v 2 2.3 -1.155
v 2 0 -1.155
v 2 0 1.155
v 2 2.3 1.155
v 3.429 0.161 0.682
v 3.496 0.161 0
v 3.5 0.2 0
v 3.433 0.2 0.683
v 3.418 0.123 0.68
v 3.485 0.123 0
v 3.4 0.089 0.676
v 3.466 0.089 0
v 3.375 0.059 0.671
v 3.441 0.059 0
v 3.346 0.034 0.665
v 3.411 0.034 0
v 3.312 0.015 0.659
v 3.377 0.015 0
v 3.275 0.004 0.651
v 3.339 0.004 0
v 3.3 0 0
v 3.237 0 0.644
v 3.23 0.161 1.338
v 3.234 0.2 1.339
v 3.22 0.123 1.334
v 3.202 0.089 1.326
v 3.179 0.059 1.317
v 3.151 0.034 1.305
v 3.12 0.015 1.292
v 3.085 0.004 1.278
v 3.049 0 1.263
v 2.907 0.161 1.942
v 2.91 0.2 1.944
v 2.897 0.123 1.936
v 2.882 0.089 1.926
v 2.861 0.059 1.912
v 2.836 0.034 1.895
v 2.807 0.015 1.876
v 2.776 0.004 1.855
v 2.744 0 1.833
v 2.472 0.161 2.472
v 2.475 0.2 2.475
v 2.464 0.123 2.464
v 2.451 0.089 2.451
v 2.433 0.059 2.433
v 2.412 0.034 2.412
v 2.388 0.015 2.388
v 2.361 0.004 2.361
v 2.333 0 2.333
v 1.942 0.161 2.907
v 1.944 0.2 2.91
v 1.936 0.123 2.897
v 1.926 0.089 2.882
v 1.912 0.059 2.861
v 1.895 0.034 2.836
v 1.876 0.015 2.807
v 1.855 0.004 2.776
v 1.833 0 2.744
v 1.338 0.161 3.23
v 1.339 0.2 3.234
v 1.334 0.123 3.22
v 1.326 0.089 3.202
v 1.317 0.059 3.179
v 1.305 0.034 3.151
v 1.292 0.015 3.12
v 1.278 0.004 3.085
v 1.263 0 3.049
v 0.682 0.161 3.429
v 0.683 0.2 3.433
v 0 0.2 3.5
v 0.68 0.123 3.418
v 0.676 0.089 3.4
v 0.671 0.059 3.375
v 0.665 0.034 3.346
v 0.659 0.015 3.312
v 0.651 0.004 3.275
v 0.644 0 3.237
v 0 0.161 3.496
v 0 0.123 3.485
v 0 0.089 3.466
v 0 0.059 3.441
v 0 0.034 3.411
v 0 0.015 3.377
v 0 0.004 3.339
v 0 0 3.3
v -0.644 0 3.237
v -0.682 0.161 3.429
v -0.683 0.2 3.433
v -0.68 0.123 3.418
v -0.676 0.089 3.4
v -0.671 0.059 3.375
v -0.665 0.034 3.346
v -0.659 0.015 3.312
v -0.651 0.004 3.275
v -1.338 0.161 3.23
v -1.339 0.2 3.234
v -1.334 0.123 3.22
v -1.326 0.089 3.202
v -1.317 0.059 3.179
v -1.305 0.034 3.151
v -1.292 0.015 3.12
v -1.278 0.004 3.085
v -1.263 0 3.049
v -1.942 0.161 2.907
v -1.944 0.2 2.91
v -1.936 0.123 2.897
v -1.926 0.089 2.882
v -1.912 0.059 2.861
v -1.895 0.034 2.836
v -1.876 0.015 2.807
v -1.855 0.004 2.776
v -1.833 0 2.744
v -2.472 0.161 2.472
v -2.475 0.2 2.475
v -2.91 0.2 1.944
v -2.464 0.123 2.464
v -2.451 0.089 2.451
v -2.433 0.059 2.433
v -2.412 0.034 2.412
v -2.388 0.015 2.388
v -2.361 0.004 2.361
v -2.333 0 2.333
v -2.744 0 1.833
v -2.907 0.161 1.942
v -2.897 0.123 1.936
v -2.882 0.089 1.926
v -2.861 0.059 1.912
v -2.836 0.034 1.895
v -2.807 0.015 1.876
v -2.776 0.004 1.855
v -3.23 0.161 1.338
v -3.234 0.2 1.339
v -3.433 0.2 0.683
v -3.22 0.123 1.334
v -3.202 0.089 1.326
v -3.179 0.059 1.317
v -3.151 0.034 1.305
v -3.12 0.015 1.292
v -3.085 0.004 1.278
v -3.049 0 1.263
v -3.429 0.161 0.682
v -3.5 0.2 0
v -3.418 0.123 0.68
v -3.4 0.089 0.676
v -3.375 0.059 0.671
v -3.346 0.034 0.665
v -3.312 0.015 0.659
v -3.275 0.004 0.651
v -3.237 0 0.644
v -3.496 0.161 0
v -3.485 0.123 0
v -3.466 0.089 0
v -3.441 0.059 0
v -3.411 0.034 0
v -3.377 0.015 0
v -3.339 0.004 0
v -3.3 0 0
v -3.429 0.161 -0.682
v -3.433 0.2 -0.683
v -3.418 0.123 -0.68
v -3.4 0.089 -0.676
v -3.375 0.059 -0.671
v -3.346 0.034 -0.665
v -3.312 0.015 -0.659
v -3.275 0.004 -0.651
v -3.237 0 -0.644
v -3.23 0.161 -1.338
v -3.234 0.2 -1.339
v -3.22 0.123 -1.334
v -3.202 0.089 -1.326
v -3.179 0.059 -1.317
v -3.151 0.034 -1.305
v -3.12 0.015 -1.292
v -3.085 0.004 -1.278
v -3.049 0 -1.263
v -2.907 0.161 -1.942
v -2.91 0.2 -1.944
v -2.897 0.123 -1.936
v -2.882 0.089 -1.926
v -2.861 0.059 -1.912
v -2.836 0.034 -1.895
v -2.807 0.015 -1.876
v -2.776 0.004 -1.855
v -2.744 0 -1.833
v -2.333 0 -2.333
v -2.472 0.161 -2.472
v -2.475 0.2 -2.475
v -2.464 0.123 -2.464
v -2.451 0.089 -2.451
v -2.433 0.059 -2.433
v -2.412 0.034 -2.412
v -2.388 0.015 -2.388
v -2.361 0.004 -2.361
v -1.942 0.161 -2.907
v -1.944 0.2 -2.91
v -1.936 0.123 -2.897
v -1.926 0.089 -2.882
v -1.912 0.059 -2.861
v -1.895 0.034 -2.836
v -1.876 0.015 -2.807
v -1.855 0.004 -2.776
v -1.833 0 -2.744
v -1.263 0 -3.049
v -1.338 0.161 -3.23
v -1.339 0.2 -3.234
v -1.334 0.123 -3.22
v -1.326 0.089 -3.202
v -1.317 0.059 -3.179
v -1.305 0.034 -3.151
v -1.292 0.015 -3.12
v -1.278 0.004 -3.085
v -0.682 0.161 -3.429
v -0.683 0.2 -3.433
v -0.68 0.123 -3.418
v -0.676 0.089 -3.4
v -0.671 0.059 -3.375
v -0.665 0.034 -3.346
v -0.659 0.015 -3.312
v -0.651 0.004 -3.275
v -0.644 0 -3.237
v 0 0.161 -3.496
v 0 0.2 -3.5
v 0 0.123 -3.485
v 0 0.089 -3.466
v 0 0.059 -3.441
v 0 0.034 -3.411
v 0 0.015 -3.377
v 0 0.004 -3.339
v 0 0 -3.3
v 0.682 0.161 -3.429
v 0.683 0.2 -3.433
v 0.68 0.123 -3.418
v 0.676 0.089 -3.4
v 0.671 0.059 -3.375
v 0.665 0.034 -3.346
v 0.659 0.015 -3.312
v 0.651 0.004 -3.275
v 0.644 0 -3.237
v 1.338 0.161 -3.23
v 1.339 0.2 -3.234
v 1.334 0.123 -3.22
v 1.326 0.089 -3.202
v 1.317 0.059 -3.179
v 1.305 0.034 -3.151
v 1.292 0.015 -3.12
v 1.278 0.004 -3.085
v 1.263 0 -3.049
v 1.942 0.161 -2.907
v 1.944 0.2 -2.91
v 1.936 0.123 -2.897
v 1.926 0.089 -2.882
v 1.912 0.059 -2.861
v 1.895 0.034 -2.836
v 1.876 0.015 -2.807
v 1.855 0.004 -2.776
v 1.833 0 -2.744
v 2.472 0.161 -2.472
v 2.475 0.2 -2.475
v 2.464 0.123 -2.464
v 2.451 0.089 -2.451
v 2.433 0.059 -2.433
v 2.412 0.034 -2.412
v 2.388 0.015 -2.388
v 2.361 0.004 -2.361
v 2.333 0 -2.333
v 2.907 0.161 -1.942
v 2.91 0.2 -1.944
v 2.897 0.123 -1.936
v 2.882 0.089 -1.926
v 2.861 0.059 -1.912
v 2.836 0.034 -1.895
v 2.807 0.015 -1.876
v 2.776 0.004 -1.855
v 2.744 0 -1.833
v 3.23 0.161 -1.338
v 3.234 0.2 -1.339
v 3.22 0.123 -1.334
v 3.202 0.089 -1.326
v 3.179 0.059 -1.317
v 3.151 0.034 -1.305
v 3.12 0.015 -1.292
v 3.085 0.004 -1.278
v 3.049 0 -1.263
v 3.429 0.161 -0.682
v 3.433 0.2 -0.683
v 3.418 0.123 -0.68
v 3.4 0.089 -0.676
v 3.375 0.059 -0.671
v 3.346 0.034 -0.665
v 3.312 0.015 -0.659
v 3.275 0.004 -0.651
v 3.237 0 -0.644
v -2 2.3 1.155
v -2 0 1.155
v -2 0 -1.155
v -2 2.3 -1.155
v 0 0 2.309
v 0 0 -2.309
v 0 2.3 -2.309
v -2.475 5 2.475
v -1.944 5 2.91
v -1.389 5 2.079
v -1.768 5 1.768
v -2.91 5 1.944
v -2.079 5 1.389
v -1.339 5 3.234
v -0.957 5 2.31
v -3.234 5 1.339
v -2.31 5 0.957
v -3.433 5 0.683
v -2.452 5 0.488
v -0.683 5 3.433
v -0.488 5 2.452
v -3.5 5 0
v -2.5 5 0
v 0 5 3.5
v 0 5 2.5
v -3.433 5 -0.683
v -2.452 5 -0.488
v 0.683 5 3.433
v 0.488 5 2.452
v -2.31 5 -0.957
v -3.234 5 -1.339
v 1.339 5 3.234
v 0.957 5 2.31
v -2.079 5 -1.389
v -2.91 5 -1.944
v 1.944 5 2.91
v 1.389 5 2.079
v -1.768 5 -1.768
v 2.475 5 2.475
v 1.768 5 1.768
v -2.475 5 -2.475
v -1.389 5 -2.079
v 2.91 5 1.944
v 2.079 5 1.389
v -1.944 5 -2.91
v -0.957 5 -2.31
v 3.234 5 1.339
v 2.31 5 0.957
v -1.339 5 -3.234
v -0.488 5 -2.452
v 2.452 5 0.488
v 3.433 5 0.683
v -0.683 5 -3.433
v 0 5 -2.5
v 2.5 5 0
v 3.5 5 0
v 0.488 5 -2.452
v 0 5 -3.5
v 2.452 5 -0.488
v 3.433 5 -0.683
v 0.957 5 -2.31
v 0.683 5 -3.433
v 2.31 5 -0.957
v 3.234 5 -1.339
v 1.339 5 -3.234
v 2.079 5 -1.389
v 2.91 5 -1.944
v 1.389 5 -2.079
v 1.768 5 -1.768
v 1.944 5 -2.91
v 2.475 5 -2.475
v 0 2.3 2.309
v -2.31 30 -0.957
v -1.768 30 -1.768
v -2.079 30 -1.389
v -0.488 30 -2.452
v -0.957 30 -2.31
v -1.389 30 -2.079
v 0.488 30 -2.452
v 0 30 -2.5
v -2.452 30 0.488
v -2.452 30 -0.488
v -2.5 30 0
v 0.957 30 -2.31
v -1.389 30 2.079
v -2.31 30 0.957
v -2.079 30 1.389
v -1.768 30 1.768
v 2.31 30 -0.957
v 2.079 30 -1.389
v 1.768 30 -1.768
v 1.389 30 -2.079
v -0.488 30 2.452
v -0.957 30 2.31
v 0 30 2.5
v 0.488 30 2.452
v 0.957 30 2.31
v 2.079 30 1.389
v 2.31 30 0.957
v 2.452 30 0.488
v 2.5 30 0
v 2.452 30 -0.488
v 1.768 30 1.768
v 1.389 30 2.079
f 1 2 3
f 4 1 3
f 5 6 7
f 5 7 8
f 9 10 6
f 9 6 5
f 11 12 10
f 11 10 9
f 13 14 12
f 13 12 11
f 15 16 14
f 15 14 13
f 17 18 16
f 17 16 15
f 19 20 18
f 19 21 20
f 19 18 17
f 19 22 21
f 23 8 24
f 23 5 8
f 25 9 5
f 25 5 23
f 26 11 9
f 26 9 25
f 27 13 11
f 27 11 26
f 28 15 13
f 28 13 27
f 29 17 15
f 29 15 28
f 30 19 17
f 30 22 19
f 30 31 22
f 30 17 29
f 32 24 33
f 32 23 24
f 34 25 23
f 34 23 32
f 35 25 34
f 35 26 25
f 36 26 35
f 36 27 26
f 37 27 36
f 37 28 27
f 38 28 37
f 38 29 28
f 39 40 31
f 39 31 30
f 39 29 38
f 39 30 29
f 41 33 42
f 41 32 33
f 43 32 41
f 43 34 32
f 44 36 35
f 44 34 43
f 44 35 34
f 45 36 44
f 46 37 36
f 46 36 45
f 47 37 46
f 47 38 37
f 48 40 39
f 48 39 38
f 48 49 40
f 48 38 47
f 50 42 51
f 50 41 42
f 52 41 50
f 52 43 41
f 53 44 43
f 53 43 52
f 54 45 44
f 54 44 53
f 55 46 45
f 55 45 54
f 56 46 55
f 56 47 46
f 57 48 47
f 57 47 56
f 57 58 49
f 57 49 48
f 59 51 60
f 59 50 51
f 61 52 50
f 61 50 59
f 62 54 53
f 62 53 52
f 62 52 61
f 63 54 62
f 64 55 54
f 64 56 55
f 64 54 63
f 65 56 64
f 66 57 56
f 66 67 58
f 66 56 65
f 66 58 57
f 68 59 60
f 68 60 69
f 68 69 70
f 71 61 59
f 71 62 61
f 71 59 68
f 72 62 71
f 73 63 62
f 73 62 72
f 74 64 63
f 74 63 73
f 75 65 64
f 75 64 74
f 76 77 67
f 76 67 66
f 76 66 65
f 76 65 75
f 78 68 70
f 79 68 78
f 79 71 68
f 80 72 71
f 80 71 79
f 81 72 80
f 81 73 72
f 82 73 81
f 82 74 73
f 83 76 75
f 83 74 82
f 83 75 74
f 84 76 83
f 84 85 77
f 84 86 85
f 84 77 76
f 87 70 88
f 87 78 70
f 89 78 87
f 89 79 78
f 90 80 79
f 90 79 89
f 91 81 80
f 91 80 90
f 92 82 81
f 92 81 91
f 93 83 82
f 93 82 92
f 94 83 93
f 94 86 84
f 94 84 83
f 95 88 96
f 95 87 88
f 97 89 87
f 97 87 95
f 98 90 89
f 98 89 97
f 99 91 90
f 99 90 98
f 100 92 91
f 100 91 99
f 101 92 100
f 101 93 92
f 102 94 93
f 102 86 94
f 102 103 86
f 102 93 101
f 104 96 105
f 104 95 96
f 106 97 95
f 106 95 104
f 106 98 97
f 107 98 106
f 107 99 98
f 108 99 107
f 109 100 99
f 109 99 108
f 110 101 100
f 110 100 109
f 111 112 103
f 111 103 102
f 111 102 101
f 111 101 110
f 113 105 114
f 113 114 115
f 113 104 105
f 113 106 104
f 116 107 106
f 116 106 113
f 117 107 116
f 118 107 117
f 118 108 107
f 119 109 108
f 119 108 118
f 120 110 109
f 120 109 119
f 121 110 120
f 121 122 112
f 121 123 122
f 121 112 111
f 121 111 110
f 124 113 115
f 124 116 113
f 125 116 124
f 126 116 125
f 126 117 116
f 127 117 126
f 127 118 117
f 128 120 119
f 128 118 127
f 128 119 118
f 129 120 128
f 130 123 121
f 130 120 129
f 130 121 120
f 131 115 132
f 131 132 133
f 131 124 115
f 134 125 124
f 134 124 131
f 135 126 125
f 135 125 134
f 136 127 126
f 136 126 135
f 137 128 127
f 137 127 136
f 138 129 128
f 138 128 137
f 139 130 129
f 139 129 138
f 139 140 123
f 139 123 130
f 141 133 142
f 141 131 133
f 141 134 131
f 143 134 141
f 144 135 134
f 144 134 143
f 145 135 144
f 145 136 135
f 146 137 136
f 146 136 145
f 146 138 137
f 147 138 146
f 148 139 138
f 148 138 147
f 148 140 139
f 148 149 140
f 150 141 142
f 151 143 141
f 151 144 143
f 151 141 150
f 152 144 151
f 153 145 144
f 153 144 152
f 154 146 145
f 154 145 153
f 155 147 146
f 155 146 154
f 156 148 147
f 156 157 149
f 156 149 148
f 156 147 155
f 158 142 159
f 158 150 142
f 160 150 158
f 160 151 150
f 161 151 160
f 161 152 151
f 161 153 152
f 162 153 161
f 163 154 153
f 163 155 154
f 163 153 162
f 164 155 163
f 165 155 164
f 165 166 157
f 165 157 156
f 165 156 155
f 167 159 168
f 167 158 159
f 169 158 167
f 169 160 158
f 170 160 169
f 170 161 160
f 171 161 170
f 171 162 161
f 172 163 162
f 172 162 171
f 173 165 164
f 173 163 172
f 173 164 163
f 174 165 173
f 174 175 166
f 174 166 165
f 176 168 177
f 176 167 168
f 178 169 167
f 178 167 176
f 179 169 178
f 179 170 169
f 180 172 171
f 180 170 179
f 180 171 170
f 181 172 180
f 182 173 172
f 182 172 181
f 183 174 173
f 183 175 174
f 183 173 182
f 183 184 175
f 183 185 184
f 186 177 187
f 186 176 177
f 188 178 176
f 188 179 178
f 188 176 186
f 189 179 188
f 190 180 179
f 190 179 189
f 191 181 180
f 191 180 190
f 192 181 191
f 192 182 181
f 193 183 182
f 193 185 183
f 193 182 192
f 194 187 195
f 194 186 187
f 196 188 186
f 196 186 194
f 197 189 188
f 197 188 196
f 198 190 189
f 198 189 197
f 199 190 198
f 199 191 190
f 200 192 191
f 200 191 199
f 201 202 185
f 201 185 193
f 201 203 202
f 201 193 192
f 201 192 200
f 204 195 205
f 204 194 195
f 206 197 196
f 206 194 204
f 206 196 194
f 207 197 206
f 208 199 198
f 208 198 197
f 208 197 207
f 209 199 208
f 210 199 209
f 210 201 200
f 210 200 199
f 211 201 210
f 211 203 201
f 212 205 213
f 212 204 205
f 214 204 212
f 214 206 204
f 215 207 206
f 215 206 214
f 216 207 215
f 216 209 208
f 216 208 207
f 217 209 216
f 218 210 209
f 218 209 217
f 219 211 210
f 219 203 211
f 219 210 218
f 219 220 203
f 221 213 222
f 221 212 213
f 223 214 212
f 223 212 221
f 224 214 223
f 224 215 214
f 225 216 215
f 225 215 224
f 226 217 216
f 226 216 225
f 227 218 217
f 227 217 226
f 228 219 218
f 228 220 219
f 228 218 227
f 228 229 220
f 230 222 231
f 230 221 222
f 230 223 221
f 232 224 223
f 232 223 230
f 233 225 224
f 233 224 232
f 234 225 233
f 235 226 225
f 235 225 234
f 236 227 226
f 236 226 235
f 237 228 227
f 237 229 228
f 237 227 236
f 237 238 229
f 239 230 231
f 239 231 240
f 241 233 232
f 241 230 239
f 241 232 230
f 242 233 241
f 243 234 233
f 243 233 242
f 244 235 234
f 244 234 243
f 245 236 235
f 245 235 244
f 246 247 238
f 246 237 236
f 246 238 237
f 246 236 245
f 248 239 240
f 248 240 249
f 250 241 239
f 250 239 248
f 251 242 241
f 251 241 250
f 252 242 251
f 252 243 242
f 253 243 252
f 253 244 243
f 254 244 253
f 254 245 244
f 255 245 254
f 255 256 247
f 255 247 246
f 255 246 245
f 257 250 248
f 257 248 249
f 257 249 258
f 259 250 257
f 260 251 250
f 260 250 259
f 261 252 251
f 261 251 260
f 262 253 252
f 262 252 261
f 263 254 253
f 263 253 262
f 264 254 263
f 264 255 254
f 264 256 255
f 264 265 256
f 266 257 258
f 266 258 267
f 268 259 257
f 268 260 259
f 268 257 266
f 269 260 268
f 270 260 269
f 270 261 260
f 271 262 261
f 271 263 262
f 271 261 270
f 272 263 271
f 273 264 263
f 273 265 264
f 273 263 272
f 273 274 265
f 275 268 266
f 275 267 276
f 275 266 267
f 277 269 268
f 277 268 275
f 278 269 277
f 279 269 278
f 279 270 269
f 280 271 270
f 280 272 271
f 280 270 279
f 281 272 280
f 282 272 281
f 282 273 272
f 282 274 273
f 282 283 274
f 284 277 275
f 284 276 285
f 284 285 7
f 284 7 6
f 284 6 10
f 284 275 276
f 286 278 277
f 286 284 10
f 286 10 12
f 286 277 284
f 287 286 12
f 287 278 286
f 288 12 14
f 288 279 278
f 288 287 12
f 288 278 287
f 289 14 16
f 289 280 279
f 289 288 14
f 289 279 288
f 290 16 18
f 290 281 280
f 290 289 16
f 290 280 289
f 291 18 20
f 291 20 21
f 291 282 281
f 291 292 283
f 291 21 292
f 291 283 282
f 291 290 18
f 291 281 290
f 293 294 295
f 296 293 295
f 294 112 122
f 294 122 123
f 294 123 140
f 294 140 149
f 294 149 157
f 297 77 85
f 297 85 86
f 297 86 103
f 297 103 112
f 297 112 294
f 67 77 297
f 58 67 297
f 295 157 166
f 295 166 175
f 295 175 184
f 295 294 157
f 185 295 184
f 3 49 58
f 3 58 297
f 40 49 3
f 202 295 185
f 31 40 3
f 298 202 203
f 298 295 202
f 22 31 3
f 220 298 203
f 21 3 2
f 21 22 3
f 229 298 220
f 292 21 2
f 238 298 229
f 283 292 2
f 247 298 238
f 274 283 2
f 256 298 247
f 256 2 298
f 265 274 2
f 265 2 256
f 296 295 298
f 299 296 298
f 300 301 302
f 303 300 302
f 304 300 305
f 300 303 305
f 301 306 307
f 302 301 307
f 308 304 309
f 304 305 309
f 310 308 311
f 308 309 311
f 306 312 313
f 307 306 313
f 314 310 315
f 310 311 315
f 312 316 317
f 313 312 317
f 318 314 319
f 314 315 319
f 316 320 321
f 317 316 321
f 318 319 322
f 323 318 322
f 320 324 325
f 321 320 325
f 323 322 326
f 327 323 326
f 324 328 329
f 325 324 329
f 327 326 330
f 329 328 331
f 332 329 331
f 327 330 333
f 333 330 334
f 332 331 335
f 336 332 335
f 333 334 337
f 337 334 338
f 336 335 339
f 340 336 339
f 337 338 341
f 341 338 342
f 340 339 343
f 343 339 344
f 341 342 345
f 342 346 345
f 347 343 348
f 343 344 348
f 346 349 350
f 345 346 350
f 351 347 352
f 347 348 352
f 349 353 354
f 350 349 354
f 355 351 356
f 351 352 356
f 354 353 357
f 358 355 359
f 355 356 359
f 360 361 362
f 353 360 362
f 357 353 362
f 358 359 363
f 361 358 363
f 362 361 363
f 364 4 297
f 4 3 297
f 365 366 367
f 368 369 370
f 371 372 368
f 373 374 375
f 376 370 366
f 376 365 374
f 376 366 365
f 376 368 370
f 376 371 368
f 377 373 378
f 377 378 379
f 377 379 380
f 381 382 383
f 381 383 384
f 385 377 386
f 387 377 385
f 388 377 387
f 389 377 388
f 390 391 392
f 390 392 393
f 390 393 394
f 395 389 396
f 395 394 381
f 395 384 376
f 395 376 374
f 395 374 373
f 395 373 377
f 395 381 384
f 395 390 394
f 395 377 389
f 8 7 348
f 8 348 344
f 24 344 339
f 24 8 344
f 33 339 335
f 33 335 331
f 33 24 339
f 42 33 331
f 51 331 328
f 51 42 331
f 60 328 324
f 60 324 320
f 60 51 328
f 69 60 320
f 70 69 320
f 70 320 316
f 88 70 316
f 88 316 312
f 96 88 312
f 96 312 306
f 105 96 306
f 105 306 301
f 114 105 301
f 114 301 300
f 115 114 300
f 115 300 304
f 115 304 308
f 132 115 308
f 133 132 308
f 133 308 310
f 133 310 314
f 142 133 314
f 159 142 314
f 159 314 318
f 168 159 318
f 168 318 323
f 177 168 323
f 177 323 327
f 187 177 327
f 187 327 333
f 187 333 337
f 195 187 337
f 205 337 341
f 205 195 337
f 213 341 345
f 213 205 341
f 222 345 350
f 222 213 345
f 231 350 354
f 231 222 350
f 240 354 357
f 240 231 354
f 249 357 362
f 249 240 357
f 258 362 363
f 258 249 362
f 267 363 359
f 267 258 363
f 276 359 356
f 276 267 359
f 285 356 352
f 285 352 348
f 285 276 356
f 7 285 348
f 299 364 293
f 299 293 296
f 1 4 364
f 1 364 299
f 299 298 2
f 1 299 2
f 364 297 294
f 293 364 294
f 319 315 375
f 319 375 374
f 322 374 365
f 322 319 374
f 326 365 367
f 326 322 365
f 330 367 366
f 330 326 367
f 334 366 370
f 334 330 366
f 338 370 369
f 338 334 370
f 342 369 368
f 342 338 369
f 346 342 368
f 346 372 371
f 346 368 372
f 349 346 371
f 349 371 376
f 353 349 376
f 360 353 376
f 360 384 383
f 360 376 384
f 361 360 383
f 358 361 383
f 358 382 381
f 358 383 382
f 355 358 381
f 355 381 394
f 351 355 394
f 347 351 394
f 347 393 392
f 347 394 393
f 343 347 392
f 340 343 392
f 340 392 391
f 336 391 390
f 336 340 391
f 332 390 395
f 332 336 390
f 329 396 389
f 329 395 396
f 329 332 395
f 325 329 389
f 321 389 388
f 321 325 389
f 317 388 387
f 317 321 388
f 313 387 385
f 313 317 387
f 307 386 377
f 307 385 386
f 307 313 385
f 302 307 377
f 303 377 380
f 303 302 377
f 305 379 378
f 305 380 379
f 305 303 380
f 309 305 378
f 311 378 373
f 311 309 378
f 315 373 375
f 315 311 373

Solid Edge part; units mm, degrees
sketch "Sketch1" plane through (0, 0, 0) normal (0, -1, 0) x (1, 0, 0)
  circle A0 centre (0, 0) radius 3.5
extrude "Protrusion1" add sketch "Sketch1" against normal blind 5
sketch "Sketch2" plane through (0, 5, 0) normal (0, 1, 0) x (-1, 0, 0)
  circle A0 centre (0, 0) radius 2.5
extrude "ExtrudedProtrusion_2" add sketch "Sketch2" along normal blind 25
fillet "Round_1" radius 0.2 1 edges at (-3.5, 0, 0)
sketch "Sketch3" plane through (0, 0, 0) normal (0, -1, 0) x (1, 0, 0)
  line L0 (0, 2.3094) -> (-2, 1.1547)
  line L1 (-2, 1.1547) -> (-2, -1.1547)
  line L2 (-2, -1.1547) -> (0, -2.3094)
  line L3 (0, -2.3094) -> (2, -1.1547)
  line L4 (2, -1.1547) -> (2, 1.1547)
  line L5 (2, 1.1547) -> (0, 2.3094)
extrude "ExtrudedCutout_2" cut sketch "Sketch3" against normal blind 2.3
properties material "Steel"
